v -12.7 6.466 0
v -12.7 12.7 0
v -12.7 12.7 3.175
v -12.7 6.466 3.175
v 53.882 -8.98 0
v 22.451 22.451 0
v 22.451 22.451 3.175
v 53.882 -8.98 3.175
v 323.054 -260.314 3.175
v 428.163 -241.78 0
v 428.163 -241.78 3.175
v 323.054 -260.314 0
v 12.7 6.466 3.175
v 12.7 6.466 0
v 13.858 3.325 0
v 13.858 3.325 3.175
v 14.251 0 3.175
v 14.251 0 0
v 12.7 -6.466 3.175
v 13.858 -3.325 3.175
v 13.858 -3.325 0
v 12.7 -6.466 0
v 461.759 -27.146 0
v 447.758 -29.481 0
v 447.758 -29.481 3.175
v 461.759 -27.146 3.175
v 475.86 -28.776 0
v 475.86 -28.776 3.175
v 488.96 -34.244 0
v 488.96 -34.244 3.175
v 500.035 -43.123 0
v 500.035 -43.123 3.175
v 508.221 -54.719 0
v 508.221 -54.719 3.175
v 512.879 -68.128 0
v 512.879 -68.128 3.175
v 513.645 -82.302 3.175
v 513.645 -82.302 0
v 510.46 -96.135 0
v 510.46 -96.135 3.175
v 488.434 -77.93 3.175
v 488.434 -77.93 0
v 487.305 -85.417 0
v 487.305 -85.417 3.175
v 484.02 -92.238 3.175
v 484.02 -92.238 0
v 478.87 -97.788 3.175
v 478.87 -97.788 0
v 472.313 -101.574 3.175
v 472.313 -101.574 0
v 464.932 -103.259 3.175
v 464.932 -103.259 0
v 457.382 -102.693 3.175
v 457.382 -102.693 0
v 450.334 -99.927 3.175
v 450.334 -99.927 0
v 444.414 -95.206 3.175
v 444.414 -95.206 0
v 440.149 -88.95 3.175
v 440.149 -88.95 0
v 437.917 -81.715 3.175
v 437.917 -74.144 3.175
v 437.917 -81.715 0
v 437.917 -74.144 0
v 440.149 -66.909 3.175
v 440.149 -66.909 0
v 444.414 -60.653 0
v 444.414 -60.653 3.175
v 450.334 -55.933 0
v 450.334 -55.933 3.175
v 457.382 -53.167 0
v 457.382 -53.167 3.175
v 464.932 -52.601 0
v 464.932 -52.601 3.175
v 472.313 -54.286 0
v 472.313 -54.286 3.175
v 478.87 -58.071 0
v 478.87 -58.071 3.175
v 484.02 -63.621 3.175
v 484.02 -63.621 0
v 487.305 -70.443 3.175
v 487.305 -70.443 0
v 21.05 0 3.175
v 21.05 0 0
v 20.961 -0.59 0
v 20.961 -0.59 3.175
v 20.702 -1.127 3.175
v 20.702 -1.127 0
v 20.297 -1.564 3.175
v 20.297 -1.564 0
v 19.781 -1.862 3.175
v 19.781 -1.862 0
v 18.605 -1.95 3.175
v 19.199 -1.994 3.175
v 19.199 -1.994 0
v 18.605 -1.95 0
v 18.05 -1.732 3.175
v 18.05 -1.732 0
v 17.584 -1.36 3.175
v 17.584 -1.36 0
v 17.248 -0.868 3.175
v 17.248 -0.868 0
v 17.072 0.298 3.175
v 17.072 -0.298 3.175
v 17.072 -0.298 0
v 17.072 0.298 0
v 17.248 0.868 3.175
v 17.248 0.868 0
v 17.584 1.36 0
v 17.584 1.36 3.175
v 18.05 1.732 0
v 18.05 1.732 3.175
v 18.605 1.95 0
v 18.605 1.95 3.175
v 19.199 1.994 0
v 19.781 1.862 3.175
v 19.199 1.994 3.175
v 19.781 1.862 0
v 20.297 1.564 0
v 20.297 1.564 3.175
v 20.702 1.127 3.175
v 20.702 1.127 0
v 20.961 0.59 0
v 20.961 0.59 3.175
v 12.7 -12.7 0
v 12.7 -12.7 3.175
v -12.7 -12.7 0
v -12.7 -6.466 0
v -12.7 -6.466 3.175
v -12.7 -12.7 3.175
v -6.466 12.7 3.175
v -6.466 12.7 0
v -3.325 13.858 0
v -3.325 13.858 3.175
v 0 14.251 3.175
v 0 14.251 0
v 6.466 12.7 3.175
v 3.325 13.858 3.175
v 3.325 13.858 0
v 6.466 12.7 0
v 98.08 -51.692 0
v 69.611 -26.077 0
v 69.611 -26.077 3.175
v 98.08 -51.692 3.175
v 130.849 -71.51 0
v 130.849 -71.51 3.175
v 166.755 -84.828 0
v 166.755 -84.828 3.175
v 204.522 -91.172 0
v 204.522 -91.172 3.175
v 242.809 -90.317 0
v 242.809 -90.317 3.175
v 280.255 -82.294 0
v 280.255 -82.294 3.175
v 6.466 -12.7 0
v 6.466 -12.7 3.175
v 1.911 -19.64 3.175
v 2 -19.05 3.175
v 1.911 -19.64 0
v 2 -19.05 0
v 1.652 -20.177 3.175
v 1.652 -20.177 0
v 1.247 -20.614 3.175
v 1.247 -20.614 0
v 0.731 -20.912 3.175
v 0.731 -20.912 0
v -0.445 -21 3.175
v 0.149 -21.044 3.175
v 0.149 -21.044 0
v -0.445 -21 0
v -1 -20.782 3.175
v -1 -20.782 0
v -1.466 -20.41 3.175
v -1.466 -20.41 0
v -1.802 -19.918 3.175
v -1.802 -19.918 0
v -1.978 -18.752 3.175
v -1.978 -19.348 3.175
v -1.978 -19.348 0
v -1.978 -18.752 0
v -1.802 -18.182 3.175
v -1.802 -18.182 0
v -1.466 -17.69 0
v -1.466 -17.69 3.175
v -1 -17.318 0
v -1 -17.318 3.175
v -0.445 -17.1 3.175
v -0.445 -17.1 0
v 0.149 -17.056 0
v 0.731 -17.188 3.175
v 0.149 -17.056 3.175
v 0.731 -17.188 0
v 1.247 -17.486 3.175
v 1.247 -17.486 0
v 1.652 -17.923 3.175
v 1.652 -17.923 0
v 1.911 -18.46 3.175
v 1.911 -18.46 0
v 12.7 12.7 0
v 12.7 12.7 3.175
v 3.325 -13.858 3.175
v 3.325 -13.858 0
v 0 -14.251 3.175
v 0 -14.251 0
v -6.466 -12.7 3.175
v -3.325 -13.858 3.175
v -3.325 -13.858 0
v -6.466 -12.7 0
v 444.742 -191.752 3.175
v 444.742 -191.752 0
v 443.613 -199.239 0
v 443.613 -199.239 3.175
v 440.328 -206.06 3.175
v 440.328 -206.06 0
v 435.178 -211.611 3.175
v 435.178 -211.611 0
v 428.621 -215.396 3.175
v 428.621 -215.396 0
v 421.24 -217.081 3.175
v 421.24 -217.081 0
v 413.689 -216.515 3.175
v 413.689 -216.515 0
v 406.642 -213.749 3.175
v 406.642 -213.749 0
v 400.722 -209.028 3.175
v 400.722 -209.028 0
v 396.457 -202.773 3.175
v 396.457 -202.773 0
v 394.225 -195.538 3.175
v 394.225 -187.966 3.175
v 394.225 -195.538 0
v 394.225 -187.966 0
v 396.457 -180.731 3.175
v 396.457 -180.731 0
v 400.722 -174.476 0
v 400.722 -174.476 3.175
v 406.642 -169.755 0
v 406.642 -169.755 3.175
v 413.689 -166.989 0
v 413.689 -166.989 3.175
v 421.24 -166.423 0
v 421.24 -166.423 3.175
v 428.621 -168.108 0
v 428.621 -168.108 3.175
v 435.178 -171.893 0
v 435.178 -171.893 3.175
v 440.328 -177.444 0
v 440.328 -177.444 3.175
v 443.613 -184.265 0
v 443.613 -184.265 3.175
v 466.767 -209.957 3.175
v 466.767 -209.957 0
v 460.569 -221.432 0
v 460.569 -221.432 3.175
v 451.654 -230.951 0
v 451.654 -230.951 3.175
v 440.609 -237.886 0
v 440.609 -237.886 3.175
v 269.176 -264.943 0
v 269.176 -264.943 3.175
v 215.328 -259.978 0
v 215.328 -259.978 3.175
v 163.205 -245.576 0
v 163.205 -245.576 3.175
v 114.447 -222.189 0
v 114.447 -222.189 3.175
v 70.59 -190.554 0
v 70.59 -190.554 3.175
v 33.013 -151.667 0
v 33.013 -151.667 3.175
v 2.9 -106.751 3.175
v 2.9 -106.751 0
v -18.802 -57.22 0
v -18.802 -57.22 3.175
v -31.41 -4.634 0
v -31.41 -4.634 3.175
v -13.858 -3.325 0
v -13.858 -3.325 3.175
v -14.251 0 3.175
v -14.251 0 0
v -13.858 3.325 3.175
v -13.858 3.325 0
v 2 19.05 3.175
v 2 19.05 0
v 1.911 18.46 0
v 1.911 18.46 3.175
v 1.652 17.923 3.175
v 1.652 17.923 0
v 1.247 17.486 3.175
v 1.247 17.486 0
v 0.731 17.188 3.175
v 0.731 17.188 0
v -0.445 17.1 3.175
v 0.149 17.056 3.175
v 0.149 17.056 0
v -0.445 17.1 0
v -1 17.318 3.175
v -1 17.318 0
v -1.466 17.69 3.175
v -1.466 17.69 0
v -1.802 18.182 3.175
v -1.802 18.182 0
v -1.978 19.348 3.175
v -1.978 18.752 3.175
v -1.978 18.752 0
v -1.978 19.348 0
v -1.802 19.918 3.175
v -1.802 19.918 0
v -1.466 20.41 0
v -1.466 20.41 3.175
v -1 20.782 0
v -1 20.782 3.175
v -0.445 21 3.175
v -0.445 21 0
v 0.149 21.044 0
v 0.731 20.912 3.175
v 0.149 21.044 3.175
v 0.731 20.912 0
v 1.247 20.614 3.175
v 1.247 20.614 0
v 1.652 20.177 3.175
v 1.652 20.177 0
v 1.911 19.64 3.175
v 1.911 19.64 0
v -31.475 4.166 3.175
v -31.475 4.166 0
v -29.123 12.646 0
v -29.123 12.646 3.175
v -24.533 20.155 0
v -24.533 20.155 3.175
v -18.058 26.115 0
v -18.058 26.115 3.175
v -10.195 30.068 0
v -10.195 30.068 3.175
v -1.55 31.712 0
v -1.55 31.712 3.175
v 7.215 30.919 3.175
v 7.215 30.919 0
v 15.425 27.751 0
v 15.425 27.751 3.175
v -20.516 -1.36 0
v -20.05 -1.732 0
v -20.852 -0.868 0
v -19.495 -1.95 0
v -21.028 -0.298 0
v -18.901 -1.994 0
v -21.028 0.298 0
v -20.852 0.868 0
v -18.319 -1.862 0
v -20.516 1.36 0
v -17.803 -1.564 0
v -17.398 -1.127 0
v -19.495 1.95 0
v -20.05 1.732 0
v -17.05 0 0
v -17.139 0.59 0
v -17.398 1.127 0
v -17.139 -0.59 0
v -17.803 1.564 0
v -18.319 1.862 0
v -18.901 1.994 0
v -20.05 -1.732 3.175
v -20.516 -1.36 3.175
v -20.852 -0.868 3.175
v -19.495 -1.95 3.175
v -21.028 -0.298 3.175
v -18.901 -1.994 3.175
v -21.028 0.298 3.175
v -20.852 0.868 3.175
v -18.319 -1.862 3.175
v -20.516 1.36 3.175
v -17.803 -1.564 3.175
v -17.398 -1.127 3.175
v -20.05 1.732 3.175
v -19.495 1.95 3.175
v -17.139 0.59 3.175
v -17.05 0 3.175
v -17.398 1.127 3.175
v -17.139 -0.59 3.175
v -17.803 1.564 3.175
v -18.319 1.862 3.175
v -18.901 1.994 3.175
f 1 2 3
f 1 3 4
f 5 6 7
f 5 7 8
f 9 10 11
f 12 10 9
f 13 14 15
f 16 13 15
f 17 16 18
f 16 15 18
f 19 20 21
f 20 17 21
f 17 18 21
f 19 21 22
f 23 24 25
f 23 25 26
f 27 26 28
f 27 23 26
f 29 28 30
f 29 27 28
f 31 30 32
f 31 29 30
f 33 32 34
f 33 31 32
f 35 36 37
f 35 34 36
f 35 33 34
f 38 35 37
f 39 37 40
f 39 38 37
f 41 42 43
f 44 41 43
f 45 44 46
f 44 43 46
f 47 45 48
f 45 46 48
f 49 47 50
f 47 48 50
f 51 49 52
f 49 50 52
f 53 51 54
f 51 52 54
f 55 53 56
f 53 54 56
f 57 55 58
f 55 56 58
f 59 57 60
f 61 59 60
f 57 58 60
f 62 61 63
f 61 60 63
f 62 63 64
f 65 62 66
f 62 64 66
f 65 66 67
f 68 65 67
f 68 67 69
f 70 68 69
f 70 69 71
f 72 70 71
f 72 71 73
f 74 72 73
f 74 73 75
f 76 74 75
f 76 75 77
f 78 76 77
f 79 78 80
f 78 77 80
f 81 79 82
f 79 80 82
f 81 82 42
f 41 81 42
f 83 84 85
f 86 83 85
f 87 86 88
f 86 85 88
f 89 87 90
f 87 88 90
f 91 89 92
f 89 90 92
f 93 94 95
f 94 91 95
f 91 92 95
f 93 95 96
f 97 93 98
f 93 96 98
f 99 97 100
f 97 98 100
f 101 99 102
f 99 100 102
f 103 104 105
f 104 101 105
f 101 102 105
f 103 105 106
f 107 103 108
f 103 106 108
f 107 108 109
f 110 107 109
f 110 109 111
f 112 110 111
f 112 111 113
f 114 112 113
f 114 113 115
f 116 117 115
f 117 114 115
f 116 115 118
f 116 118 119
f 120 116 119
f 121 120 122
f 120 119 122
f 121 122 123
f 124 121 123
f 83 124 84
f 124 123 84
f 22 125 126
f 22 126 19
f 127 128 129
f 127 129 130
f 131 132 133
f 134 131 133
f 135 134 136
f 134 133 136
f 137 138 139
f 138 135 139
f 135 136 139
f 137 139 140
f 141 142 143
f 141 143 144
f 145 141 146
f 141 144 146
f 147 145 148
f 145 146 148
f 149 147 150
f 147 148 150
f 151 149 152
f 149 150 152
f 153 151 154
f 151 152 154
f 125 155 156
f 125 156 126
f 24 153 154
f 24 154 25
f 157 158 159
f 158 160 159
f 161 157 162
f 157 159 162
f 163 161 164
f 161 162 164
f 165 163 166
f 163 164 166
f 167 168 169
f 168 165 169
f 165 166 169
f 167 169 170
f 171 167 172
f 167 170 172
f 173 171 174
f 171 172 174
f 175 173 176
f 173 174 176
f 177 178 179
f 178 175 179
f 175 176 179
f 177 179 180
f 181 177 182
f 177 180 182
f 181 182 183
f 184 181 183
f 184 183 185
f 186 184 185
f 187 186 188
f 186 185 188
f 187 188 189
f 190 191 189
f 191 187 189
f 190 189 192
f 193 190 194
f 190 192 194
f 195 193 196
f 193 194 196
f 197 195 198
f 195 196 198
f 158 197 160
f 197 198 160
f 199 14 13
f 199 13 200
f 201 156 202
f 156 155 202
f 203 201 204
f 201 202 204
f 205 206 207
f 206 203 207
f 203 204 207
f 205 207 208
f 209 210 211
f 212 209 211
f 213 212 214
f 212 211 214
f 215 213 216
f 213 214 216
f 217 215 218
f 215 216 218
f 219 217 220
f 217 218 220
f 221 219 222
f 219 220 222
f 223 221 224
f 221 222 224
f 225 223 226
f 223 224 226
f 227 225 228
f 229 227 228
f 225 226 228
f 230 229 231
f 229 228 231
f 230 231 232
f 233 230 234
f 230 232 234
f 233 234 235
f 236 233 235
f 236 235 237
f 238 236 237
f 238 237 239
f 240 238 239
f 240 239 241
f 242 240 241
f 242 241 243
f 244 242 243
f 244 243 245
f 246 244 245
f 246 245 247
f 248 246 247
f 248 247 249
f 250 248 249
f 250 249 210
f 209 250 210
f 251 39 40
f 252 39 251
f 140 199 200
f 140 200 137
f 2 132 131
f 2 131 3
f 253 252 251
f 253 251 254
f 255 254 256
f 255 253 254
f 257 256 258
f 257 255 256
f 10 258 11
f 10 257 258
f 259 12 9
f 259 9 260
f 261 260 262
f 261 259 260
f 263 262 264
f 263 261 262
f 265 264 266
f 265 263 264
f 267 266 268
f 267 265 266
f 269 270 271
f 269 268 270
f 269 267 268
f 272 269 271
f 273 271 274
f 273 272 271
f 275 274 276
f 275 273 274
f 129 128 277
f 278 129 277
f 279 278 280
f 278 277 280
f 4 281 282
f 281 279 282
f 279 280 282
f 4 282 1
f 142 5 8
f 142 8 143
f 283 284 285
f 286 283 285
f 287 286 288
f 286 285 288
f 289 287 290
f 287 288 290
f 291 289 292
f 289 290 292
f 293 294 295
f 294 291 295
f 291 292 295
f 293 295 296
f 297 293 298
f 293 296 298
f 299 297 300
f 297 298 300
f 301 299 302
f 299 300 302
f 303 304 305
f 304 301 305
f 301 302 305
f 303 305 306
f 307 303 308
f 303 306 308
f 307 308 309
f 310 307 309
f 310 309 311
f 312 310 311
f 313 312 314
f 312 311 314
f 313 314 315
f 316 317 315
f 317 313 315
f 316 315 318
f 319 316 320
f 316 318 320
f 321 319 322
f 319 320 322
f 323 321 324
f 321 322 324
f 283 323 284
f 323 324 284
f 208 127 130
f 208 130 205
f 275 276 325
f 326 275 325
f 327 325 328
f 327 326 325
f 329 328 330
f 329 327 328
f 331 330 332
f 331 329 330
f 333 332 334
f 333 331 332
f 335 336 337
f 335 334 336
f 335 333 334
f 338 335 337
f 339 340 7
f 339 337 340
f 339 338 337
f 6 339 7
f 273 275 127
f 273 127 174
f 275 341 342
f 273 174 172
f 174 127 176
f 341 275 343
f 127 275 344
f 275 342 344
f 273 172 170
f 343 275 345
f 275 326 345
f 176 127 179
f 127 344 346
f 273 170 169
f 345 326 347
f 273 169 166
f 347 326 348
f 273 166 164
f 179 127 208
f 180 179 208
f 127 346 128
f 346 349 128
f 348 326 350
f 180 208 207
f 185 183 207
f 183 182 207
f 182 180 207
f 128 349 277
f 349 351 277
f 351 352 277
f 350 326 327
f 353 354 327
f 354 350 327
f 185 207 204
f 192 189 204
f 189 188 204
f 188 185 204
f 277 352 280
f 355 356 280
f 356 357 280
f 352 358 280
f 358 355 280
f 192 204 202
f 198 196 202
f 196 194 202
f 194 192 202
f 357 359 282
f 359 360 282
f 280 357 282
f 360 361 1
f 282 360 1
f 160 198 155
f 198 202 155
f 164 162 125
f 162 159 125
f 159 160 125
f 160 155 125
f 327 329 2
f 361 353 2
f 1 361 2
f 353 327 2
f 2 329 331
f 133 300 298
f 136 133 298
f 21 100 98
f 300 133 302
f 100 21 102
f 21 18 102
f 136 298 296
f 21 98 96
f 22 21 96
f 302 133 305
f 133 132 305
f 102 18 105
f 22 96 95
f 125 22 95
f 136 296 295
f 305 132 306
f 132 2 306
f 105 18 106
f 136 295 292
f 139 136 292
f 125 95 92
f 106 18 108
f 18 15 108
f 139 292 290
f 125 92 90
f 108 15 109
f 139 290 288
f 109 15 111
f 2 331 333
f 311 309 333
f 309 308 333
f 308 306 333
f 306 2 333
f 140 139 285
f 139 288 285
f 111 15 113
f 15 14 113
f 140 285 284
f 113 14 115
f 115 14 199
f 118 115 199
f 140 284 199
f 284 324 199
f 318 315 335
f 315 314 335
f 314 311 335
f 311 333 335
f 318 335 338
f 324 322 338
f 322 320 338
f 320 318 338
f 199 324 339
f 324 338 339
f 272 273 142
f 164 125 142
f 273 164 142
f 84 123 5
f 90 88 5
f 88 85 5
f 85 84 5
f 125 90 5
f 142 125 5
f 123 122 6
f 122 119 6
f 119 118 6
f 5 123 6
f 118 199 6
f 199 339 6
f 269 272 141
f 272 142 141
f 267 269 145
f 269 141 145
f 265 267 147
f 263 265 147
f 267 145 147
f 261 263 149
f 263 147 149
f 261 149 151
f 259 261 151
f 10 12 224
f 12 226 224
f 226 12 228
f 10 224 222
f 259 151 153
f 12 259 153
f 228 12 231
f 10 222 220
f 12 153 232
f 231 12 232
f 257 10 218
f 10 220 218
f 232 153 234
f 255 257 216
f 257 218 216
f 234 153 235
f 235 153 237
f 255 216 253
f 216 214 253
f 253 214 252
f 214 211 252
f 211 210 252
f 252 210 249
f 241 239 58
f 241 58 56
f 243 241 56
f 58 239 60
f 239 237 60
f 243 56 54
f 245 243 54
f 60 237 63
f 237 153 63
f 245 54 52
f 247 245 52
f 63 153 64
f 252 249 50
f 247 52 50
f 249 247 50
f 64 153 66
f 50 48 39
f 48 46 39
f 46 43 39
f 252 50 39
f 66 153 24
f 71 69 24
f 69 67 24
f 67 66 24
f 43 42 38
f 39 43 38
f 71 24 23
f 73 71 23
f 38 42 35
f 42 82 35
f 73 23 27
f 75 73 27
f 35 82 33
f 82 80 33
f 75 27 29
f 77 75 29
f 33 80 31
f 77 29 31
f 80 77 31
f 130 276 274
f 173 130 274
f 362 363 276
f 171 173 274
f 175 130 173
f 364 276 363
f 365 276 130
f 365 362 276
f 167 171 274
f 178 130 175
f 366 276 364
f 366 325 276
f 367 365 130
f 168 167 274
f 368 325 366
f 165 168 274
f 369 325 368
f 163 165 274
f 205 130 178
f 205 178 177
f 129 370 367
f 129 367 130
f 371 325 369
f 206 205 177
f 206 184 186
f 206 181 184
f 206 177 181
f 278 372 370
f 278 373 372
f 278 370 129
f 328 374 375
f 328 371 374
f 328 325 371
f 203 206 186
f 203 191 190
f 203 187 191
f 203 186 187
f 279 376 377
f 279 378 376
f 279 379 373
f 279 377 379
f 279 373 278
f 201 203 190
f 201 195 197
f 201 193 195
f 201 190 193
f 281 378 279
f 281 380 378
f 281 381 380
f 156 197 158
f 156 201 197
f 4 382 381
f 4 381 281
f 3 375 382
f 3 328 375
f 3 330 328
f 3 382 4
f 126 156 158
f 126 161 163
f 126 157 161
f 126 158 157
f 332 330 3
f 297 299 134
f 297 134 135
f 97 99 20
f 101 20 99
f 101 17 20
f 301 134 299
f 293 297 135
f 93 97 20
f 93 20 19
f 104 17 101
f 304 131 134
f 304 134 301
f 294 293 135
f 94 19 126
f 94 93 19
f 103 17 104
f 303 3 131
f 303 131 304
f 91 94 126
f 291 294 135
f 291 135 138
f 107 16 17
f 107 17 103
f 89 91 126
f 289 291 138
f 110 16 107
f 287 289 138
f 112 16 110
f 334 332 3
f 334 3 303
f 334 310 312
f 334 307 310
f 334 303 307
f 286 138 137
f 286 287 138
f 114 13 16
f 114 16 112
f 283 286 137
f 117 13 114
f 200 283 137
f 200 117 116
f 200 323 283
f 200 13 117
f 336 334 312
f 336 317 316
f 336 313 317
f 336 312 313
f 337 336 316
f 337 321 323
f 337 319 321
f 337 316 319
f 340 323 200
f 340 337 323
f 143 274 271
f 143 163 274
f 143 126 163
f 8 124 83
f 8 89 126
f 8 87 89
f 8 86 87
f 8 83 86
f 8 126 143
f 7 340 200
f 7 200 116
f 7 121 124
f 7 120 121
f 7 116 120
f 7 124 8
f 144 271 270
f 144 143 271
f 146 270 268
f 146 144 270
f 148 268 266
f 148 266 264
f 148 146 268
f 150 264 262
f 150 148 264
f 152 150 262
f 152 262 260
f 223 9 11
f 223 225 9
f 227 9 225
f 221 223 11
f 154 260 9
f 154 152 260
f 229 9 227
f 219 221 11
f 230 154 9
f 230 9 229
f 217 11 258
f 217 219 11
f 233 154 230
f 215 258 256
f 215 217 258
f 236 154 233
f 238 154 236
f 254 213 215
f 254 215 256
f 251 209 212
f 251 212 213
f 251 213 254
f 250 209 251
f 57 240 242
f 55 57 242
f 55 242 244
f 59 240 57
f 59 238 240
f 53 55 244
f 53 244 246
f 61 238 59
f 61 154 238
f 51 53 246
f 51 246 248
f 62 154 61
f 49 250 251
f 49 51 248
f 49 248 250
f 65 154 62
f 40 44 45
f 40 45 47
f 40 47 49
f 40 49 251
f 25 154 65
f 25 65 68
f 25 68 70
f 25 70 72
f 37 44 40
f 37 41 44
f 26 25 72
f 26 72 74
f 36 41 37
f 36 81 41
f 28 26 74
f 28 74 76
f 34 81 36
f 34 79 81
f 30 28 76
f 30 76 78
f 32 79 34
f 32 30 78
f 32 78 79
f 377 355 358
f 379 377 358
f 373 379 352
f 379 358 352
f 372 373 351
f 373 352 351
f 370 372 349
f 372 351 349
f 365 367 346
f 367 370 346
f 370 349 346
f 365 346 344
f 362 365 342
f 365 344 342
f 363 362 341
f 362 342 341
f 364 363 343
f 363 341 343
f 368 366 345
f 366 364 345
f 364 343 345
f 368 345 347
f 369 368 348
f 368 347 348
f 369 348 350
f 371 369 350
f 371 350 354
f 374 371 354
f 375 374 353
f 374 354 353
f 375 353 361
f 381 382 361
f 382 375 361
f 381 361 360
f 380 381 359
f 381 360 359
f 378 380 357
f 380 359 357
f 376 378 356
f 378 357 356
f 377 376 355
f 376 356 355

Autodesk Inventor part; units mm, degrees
ref_plane "YZ Plane" through (0, 0, 0) normal (1, 0, 0) x (0, 1, 0)
ref_plane "XZ Plane" through (0, 0, 0) normal (0, 1, 0) x (-1, 0, 0)
ref_plane "XY Plane" through (0, 0, 0) normal (0, 0, 1) x (1, 0, 0)
sketch "Sketch1" plane through (0, 0, 0) normal (0, 0, 1) x (1, 0, 0)
  line L0 (6.4658, -12.7) -> (12.7, -12.7) projected
  arc A0 (-6.4658, -12.7) -> (6.4658, -12.7) centre (0, 0) ccw projected
  line L1 (-12.7, -12.7) -> (-6.4658, -12.7) projected
  line L2 (-12.7, -6.4658) -> (-12.7, -12.7) projected
  arc A1 (-12.7, 6.4658) -> (-12.7, -6.4658) centre (0, 0) ccw projected
  line L3 (-12.7, 12.7) -> (-12.7, 6.4658) projected
  line L4 (-6.4658, 12.7) -> (-12.7, 12.7) projected
  arc A2 (6.4658, 12.7) -> (-6.4658, 12.7) centre (0, 0) ccw projected
  line L5 (12.7, 12.7) -> (6.4658, 12.7) projected
  line L6 (12.7, 6.4658) -> (12.7, 12.7) projected
  arc A3 (12.7, -6.4658) -> (12.7, 6.4658) centre (0, 0) ccw projected
  line L7 (12.7, -12.7) -> (12.7, -6.4658) projected
  arc A4 (22.4506, 22.4506) -> (11.1037, -29.7451) centre (0, 0) ccw projected
  line L8 (53.8815, -8.9803) -> (157.065, -121.1361)
  line L9 (157.065, -121.1361) -> (447.7579, -29.481)
  line L10 (157.065, -121.1361) -> (461.865, -121.1361) construction
  circle A5 centre (463.0337, -77.9298) radius 50.8
  circle A6 centre (419.3415, -191.752) radius 50.8
  line L11 (463.0337, -77.9298) -> (419.3415, -191.752)
  line L12 (463.0337, -77.9298) -> (584.9537, -77.9298) construction
  arc A7 (-31.41, -4.6344) -> (323.0536, -260.3138) centre (270.1256, 39.8556) ccw
  line L13 (428.1628, -241.7802) -> (323.0536, -260.3138)
  line L14 (428.1628, -241.7802) -> (534.8936, -241.7802) construction
  line L15 (510.4596, -96.1349) -> (466.7674, -209.9571)
  circle A8 centre (0, -19.05) radius 2
  circle A9 centre (19.05, 0) radius 2
  circle A10 centre (-19.05, 0) radius 2
  circle A11 centre (0, 19.05) radius 2
  line L16 (22.4506, 22.4506) -> (53.8815, -8.9803) projected
  line L17 (52.7468, -14.1998) -> (11.1037, -29.7451) projected
  arc A12 (52.7468, -14.1998) -> (53.8815, -8.9803) centre (51.6365, -11.2253) ccw projected
  circle A13 centre (0, -19.05) radius 2.735 projected
  circle A14 centre (-19.05, 0) radius 2.735 projected
  circle A15 centre (0, 19.05) radius 2.735 projected
  circle A16 centre (19.05, 0) radius 2.735 projected
  circle A17 centre (463.0337, -77.9298) radius 25.4
  circle A18 centre (419.3415, -191.752) radius 25.4
  point P0 (50.8347, -14.9136)
  point P1 (54.0605, -9.1748)
  dimension "d0" = 152.4
  dimension "d1" = 304.8
  dimension "d2" = 17.5
  dimension "d3" = 101.6
  dimension "d4" = 101.6
  dimension "d5" = 121.92
  dimension "d6" = 111
  dimension "d7" = 609.6
  dimension "d9" = 170
  dimension "d10" = 4
  dimension "d11" = 4
  dimension "d12" = 4
  dimension "d13" = 4
  dimension "d16" = 50.8
  dimension "d17" = 50.8
extrude "Extrusion1" add sketch "Sketch1" along normal blind 3.175 contours L16 L8 L9 A5 L11 A6 L13 A7 A4 | A6 | A5 | A6 L11 A5 L15 | A13 | A14 | A15 | A16
fillet "Fillet1" radius 203.2 1 edges at (157.065, -121.1361, 1.5875)
properties part number "WhipperArm" material "MDF Medium Density Fiberboard"
